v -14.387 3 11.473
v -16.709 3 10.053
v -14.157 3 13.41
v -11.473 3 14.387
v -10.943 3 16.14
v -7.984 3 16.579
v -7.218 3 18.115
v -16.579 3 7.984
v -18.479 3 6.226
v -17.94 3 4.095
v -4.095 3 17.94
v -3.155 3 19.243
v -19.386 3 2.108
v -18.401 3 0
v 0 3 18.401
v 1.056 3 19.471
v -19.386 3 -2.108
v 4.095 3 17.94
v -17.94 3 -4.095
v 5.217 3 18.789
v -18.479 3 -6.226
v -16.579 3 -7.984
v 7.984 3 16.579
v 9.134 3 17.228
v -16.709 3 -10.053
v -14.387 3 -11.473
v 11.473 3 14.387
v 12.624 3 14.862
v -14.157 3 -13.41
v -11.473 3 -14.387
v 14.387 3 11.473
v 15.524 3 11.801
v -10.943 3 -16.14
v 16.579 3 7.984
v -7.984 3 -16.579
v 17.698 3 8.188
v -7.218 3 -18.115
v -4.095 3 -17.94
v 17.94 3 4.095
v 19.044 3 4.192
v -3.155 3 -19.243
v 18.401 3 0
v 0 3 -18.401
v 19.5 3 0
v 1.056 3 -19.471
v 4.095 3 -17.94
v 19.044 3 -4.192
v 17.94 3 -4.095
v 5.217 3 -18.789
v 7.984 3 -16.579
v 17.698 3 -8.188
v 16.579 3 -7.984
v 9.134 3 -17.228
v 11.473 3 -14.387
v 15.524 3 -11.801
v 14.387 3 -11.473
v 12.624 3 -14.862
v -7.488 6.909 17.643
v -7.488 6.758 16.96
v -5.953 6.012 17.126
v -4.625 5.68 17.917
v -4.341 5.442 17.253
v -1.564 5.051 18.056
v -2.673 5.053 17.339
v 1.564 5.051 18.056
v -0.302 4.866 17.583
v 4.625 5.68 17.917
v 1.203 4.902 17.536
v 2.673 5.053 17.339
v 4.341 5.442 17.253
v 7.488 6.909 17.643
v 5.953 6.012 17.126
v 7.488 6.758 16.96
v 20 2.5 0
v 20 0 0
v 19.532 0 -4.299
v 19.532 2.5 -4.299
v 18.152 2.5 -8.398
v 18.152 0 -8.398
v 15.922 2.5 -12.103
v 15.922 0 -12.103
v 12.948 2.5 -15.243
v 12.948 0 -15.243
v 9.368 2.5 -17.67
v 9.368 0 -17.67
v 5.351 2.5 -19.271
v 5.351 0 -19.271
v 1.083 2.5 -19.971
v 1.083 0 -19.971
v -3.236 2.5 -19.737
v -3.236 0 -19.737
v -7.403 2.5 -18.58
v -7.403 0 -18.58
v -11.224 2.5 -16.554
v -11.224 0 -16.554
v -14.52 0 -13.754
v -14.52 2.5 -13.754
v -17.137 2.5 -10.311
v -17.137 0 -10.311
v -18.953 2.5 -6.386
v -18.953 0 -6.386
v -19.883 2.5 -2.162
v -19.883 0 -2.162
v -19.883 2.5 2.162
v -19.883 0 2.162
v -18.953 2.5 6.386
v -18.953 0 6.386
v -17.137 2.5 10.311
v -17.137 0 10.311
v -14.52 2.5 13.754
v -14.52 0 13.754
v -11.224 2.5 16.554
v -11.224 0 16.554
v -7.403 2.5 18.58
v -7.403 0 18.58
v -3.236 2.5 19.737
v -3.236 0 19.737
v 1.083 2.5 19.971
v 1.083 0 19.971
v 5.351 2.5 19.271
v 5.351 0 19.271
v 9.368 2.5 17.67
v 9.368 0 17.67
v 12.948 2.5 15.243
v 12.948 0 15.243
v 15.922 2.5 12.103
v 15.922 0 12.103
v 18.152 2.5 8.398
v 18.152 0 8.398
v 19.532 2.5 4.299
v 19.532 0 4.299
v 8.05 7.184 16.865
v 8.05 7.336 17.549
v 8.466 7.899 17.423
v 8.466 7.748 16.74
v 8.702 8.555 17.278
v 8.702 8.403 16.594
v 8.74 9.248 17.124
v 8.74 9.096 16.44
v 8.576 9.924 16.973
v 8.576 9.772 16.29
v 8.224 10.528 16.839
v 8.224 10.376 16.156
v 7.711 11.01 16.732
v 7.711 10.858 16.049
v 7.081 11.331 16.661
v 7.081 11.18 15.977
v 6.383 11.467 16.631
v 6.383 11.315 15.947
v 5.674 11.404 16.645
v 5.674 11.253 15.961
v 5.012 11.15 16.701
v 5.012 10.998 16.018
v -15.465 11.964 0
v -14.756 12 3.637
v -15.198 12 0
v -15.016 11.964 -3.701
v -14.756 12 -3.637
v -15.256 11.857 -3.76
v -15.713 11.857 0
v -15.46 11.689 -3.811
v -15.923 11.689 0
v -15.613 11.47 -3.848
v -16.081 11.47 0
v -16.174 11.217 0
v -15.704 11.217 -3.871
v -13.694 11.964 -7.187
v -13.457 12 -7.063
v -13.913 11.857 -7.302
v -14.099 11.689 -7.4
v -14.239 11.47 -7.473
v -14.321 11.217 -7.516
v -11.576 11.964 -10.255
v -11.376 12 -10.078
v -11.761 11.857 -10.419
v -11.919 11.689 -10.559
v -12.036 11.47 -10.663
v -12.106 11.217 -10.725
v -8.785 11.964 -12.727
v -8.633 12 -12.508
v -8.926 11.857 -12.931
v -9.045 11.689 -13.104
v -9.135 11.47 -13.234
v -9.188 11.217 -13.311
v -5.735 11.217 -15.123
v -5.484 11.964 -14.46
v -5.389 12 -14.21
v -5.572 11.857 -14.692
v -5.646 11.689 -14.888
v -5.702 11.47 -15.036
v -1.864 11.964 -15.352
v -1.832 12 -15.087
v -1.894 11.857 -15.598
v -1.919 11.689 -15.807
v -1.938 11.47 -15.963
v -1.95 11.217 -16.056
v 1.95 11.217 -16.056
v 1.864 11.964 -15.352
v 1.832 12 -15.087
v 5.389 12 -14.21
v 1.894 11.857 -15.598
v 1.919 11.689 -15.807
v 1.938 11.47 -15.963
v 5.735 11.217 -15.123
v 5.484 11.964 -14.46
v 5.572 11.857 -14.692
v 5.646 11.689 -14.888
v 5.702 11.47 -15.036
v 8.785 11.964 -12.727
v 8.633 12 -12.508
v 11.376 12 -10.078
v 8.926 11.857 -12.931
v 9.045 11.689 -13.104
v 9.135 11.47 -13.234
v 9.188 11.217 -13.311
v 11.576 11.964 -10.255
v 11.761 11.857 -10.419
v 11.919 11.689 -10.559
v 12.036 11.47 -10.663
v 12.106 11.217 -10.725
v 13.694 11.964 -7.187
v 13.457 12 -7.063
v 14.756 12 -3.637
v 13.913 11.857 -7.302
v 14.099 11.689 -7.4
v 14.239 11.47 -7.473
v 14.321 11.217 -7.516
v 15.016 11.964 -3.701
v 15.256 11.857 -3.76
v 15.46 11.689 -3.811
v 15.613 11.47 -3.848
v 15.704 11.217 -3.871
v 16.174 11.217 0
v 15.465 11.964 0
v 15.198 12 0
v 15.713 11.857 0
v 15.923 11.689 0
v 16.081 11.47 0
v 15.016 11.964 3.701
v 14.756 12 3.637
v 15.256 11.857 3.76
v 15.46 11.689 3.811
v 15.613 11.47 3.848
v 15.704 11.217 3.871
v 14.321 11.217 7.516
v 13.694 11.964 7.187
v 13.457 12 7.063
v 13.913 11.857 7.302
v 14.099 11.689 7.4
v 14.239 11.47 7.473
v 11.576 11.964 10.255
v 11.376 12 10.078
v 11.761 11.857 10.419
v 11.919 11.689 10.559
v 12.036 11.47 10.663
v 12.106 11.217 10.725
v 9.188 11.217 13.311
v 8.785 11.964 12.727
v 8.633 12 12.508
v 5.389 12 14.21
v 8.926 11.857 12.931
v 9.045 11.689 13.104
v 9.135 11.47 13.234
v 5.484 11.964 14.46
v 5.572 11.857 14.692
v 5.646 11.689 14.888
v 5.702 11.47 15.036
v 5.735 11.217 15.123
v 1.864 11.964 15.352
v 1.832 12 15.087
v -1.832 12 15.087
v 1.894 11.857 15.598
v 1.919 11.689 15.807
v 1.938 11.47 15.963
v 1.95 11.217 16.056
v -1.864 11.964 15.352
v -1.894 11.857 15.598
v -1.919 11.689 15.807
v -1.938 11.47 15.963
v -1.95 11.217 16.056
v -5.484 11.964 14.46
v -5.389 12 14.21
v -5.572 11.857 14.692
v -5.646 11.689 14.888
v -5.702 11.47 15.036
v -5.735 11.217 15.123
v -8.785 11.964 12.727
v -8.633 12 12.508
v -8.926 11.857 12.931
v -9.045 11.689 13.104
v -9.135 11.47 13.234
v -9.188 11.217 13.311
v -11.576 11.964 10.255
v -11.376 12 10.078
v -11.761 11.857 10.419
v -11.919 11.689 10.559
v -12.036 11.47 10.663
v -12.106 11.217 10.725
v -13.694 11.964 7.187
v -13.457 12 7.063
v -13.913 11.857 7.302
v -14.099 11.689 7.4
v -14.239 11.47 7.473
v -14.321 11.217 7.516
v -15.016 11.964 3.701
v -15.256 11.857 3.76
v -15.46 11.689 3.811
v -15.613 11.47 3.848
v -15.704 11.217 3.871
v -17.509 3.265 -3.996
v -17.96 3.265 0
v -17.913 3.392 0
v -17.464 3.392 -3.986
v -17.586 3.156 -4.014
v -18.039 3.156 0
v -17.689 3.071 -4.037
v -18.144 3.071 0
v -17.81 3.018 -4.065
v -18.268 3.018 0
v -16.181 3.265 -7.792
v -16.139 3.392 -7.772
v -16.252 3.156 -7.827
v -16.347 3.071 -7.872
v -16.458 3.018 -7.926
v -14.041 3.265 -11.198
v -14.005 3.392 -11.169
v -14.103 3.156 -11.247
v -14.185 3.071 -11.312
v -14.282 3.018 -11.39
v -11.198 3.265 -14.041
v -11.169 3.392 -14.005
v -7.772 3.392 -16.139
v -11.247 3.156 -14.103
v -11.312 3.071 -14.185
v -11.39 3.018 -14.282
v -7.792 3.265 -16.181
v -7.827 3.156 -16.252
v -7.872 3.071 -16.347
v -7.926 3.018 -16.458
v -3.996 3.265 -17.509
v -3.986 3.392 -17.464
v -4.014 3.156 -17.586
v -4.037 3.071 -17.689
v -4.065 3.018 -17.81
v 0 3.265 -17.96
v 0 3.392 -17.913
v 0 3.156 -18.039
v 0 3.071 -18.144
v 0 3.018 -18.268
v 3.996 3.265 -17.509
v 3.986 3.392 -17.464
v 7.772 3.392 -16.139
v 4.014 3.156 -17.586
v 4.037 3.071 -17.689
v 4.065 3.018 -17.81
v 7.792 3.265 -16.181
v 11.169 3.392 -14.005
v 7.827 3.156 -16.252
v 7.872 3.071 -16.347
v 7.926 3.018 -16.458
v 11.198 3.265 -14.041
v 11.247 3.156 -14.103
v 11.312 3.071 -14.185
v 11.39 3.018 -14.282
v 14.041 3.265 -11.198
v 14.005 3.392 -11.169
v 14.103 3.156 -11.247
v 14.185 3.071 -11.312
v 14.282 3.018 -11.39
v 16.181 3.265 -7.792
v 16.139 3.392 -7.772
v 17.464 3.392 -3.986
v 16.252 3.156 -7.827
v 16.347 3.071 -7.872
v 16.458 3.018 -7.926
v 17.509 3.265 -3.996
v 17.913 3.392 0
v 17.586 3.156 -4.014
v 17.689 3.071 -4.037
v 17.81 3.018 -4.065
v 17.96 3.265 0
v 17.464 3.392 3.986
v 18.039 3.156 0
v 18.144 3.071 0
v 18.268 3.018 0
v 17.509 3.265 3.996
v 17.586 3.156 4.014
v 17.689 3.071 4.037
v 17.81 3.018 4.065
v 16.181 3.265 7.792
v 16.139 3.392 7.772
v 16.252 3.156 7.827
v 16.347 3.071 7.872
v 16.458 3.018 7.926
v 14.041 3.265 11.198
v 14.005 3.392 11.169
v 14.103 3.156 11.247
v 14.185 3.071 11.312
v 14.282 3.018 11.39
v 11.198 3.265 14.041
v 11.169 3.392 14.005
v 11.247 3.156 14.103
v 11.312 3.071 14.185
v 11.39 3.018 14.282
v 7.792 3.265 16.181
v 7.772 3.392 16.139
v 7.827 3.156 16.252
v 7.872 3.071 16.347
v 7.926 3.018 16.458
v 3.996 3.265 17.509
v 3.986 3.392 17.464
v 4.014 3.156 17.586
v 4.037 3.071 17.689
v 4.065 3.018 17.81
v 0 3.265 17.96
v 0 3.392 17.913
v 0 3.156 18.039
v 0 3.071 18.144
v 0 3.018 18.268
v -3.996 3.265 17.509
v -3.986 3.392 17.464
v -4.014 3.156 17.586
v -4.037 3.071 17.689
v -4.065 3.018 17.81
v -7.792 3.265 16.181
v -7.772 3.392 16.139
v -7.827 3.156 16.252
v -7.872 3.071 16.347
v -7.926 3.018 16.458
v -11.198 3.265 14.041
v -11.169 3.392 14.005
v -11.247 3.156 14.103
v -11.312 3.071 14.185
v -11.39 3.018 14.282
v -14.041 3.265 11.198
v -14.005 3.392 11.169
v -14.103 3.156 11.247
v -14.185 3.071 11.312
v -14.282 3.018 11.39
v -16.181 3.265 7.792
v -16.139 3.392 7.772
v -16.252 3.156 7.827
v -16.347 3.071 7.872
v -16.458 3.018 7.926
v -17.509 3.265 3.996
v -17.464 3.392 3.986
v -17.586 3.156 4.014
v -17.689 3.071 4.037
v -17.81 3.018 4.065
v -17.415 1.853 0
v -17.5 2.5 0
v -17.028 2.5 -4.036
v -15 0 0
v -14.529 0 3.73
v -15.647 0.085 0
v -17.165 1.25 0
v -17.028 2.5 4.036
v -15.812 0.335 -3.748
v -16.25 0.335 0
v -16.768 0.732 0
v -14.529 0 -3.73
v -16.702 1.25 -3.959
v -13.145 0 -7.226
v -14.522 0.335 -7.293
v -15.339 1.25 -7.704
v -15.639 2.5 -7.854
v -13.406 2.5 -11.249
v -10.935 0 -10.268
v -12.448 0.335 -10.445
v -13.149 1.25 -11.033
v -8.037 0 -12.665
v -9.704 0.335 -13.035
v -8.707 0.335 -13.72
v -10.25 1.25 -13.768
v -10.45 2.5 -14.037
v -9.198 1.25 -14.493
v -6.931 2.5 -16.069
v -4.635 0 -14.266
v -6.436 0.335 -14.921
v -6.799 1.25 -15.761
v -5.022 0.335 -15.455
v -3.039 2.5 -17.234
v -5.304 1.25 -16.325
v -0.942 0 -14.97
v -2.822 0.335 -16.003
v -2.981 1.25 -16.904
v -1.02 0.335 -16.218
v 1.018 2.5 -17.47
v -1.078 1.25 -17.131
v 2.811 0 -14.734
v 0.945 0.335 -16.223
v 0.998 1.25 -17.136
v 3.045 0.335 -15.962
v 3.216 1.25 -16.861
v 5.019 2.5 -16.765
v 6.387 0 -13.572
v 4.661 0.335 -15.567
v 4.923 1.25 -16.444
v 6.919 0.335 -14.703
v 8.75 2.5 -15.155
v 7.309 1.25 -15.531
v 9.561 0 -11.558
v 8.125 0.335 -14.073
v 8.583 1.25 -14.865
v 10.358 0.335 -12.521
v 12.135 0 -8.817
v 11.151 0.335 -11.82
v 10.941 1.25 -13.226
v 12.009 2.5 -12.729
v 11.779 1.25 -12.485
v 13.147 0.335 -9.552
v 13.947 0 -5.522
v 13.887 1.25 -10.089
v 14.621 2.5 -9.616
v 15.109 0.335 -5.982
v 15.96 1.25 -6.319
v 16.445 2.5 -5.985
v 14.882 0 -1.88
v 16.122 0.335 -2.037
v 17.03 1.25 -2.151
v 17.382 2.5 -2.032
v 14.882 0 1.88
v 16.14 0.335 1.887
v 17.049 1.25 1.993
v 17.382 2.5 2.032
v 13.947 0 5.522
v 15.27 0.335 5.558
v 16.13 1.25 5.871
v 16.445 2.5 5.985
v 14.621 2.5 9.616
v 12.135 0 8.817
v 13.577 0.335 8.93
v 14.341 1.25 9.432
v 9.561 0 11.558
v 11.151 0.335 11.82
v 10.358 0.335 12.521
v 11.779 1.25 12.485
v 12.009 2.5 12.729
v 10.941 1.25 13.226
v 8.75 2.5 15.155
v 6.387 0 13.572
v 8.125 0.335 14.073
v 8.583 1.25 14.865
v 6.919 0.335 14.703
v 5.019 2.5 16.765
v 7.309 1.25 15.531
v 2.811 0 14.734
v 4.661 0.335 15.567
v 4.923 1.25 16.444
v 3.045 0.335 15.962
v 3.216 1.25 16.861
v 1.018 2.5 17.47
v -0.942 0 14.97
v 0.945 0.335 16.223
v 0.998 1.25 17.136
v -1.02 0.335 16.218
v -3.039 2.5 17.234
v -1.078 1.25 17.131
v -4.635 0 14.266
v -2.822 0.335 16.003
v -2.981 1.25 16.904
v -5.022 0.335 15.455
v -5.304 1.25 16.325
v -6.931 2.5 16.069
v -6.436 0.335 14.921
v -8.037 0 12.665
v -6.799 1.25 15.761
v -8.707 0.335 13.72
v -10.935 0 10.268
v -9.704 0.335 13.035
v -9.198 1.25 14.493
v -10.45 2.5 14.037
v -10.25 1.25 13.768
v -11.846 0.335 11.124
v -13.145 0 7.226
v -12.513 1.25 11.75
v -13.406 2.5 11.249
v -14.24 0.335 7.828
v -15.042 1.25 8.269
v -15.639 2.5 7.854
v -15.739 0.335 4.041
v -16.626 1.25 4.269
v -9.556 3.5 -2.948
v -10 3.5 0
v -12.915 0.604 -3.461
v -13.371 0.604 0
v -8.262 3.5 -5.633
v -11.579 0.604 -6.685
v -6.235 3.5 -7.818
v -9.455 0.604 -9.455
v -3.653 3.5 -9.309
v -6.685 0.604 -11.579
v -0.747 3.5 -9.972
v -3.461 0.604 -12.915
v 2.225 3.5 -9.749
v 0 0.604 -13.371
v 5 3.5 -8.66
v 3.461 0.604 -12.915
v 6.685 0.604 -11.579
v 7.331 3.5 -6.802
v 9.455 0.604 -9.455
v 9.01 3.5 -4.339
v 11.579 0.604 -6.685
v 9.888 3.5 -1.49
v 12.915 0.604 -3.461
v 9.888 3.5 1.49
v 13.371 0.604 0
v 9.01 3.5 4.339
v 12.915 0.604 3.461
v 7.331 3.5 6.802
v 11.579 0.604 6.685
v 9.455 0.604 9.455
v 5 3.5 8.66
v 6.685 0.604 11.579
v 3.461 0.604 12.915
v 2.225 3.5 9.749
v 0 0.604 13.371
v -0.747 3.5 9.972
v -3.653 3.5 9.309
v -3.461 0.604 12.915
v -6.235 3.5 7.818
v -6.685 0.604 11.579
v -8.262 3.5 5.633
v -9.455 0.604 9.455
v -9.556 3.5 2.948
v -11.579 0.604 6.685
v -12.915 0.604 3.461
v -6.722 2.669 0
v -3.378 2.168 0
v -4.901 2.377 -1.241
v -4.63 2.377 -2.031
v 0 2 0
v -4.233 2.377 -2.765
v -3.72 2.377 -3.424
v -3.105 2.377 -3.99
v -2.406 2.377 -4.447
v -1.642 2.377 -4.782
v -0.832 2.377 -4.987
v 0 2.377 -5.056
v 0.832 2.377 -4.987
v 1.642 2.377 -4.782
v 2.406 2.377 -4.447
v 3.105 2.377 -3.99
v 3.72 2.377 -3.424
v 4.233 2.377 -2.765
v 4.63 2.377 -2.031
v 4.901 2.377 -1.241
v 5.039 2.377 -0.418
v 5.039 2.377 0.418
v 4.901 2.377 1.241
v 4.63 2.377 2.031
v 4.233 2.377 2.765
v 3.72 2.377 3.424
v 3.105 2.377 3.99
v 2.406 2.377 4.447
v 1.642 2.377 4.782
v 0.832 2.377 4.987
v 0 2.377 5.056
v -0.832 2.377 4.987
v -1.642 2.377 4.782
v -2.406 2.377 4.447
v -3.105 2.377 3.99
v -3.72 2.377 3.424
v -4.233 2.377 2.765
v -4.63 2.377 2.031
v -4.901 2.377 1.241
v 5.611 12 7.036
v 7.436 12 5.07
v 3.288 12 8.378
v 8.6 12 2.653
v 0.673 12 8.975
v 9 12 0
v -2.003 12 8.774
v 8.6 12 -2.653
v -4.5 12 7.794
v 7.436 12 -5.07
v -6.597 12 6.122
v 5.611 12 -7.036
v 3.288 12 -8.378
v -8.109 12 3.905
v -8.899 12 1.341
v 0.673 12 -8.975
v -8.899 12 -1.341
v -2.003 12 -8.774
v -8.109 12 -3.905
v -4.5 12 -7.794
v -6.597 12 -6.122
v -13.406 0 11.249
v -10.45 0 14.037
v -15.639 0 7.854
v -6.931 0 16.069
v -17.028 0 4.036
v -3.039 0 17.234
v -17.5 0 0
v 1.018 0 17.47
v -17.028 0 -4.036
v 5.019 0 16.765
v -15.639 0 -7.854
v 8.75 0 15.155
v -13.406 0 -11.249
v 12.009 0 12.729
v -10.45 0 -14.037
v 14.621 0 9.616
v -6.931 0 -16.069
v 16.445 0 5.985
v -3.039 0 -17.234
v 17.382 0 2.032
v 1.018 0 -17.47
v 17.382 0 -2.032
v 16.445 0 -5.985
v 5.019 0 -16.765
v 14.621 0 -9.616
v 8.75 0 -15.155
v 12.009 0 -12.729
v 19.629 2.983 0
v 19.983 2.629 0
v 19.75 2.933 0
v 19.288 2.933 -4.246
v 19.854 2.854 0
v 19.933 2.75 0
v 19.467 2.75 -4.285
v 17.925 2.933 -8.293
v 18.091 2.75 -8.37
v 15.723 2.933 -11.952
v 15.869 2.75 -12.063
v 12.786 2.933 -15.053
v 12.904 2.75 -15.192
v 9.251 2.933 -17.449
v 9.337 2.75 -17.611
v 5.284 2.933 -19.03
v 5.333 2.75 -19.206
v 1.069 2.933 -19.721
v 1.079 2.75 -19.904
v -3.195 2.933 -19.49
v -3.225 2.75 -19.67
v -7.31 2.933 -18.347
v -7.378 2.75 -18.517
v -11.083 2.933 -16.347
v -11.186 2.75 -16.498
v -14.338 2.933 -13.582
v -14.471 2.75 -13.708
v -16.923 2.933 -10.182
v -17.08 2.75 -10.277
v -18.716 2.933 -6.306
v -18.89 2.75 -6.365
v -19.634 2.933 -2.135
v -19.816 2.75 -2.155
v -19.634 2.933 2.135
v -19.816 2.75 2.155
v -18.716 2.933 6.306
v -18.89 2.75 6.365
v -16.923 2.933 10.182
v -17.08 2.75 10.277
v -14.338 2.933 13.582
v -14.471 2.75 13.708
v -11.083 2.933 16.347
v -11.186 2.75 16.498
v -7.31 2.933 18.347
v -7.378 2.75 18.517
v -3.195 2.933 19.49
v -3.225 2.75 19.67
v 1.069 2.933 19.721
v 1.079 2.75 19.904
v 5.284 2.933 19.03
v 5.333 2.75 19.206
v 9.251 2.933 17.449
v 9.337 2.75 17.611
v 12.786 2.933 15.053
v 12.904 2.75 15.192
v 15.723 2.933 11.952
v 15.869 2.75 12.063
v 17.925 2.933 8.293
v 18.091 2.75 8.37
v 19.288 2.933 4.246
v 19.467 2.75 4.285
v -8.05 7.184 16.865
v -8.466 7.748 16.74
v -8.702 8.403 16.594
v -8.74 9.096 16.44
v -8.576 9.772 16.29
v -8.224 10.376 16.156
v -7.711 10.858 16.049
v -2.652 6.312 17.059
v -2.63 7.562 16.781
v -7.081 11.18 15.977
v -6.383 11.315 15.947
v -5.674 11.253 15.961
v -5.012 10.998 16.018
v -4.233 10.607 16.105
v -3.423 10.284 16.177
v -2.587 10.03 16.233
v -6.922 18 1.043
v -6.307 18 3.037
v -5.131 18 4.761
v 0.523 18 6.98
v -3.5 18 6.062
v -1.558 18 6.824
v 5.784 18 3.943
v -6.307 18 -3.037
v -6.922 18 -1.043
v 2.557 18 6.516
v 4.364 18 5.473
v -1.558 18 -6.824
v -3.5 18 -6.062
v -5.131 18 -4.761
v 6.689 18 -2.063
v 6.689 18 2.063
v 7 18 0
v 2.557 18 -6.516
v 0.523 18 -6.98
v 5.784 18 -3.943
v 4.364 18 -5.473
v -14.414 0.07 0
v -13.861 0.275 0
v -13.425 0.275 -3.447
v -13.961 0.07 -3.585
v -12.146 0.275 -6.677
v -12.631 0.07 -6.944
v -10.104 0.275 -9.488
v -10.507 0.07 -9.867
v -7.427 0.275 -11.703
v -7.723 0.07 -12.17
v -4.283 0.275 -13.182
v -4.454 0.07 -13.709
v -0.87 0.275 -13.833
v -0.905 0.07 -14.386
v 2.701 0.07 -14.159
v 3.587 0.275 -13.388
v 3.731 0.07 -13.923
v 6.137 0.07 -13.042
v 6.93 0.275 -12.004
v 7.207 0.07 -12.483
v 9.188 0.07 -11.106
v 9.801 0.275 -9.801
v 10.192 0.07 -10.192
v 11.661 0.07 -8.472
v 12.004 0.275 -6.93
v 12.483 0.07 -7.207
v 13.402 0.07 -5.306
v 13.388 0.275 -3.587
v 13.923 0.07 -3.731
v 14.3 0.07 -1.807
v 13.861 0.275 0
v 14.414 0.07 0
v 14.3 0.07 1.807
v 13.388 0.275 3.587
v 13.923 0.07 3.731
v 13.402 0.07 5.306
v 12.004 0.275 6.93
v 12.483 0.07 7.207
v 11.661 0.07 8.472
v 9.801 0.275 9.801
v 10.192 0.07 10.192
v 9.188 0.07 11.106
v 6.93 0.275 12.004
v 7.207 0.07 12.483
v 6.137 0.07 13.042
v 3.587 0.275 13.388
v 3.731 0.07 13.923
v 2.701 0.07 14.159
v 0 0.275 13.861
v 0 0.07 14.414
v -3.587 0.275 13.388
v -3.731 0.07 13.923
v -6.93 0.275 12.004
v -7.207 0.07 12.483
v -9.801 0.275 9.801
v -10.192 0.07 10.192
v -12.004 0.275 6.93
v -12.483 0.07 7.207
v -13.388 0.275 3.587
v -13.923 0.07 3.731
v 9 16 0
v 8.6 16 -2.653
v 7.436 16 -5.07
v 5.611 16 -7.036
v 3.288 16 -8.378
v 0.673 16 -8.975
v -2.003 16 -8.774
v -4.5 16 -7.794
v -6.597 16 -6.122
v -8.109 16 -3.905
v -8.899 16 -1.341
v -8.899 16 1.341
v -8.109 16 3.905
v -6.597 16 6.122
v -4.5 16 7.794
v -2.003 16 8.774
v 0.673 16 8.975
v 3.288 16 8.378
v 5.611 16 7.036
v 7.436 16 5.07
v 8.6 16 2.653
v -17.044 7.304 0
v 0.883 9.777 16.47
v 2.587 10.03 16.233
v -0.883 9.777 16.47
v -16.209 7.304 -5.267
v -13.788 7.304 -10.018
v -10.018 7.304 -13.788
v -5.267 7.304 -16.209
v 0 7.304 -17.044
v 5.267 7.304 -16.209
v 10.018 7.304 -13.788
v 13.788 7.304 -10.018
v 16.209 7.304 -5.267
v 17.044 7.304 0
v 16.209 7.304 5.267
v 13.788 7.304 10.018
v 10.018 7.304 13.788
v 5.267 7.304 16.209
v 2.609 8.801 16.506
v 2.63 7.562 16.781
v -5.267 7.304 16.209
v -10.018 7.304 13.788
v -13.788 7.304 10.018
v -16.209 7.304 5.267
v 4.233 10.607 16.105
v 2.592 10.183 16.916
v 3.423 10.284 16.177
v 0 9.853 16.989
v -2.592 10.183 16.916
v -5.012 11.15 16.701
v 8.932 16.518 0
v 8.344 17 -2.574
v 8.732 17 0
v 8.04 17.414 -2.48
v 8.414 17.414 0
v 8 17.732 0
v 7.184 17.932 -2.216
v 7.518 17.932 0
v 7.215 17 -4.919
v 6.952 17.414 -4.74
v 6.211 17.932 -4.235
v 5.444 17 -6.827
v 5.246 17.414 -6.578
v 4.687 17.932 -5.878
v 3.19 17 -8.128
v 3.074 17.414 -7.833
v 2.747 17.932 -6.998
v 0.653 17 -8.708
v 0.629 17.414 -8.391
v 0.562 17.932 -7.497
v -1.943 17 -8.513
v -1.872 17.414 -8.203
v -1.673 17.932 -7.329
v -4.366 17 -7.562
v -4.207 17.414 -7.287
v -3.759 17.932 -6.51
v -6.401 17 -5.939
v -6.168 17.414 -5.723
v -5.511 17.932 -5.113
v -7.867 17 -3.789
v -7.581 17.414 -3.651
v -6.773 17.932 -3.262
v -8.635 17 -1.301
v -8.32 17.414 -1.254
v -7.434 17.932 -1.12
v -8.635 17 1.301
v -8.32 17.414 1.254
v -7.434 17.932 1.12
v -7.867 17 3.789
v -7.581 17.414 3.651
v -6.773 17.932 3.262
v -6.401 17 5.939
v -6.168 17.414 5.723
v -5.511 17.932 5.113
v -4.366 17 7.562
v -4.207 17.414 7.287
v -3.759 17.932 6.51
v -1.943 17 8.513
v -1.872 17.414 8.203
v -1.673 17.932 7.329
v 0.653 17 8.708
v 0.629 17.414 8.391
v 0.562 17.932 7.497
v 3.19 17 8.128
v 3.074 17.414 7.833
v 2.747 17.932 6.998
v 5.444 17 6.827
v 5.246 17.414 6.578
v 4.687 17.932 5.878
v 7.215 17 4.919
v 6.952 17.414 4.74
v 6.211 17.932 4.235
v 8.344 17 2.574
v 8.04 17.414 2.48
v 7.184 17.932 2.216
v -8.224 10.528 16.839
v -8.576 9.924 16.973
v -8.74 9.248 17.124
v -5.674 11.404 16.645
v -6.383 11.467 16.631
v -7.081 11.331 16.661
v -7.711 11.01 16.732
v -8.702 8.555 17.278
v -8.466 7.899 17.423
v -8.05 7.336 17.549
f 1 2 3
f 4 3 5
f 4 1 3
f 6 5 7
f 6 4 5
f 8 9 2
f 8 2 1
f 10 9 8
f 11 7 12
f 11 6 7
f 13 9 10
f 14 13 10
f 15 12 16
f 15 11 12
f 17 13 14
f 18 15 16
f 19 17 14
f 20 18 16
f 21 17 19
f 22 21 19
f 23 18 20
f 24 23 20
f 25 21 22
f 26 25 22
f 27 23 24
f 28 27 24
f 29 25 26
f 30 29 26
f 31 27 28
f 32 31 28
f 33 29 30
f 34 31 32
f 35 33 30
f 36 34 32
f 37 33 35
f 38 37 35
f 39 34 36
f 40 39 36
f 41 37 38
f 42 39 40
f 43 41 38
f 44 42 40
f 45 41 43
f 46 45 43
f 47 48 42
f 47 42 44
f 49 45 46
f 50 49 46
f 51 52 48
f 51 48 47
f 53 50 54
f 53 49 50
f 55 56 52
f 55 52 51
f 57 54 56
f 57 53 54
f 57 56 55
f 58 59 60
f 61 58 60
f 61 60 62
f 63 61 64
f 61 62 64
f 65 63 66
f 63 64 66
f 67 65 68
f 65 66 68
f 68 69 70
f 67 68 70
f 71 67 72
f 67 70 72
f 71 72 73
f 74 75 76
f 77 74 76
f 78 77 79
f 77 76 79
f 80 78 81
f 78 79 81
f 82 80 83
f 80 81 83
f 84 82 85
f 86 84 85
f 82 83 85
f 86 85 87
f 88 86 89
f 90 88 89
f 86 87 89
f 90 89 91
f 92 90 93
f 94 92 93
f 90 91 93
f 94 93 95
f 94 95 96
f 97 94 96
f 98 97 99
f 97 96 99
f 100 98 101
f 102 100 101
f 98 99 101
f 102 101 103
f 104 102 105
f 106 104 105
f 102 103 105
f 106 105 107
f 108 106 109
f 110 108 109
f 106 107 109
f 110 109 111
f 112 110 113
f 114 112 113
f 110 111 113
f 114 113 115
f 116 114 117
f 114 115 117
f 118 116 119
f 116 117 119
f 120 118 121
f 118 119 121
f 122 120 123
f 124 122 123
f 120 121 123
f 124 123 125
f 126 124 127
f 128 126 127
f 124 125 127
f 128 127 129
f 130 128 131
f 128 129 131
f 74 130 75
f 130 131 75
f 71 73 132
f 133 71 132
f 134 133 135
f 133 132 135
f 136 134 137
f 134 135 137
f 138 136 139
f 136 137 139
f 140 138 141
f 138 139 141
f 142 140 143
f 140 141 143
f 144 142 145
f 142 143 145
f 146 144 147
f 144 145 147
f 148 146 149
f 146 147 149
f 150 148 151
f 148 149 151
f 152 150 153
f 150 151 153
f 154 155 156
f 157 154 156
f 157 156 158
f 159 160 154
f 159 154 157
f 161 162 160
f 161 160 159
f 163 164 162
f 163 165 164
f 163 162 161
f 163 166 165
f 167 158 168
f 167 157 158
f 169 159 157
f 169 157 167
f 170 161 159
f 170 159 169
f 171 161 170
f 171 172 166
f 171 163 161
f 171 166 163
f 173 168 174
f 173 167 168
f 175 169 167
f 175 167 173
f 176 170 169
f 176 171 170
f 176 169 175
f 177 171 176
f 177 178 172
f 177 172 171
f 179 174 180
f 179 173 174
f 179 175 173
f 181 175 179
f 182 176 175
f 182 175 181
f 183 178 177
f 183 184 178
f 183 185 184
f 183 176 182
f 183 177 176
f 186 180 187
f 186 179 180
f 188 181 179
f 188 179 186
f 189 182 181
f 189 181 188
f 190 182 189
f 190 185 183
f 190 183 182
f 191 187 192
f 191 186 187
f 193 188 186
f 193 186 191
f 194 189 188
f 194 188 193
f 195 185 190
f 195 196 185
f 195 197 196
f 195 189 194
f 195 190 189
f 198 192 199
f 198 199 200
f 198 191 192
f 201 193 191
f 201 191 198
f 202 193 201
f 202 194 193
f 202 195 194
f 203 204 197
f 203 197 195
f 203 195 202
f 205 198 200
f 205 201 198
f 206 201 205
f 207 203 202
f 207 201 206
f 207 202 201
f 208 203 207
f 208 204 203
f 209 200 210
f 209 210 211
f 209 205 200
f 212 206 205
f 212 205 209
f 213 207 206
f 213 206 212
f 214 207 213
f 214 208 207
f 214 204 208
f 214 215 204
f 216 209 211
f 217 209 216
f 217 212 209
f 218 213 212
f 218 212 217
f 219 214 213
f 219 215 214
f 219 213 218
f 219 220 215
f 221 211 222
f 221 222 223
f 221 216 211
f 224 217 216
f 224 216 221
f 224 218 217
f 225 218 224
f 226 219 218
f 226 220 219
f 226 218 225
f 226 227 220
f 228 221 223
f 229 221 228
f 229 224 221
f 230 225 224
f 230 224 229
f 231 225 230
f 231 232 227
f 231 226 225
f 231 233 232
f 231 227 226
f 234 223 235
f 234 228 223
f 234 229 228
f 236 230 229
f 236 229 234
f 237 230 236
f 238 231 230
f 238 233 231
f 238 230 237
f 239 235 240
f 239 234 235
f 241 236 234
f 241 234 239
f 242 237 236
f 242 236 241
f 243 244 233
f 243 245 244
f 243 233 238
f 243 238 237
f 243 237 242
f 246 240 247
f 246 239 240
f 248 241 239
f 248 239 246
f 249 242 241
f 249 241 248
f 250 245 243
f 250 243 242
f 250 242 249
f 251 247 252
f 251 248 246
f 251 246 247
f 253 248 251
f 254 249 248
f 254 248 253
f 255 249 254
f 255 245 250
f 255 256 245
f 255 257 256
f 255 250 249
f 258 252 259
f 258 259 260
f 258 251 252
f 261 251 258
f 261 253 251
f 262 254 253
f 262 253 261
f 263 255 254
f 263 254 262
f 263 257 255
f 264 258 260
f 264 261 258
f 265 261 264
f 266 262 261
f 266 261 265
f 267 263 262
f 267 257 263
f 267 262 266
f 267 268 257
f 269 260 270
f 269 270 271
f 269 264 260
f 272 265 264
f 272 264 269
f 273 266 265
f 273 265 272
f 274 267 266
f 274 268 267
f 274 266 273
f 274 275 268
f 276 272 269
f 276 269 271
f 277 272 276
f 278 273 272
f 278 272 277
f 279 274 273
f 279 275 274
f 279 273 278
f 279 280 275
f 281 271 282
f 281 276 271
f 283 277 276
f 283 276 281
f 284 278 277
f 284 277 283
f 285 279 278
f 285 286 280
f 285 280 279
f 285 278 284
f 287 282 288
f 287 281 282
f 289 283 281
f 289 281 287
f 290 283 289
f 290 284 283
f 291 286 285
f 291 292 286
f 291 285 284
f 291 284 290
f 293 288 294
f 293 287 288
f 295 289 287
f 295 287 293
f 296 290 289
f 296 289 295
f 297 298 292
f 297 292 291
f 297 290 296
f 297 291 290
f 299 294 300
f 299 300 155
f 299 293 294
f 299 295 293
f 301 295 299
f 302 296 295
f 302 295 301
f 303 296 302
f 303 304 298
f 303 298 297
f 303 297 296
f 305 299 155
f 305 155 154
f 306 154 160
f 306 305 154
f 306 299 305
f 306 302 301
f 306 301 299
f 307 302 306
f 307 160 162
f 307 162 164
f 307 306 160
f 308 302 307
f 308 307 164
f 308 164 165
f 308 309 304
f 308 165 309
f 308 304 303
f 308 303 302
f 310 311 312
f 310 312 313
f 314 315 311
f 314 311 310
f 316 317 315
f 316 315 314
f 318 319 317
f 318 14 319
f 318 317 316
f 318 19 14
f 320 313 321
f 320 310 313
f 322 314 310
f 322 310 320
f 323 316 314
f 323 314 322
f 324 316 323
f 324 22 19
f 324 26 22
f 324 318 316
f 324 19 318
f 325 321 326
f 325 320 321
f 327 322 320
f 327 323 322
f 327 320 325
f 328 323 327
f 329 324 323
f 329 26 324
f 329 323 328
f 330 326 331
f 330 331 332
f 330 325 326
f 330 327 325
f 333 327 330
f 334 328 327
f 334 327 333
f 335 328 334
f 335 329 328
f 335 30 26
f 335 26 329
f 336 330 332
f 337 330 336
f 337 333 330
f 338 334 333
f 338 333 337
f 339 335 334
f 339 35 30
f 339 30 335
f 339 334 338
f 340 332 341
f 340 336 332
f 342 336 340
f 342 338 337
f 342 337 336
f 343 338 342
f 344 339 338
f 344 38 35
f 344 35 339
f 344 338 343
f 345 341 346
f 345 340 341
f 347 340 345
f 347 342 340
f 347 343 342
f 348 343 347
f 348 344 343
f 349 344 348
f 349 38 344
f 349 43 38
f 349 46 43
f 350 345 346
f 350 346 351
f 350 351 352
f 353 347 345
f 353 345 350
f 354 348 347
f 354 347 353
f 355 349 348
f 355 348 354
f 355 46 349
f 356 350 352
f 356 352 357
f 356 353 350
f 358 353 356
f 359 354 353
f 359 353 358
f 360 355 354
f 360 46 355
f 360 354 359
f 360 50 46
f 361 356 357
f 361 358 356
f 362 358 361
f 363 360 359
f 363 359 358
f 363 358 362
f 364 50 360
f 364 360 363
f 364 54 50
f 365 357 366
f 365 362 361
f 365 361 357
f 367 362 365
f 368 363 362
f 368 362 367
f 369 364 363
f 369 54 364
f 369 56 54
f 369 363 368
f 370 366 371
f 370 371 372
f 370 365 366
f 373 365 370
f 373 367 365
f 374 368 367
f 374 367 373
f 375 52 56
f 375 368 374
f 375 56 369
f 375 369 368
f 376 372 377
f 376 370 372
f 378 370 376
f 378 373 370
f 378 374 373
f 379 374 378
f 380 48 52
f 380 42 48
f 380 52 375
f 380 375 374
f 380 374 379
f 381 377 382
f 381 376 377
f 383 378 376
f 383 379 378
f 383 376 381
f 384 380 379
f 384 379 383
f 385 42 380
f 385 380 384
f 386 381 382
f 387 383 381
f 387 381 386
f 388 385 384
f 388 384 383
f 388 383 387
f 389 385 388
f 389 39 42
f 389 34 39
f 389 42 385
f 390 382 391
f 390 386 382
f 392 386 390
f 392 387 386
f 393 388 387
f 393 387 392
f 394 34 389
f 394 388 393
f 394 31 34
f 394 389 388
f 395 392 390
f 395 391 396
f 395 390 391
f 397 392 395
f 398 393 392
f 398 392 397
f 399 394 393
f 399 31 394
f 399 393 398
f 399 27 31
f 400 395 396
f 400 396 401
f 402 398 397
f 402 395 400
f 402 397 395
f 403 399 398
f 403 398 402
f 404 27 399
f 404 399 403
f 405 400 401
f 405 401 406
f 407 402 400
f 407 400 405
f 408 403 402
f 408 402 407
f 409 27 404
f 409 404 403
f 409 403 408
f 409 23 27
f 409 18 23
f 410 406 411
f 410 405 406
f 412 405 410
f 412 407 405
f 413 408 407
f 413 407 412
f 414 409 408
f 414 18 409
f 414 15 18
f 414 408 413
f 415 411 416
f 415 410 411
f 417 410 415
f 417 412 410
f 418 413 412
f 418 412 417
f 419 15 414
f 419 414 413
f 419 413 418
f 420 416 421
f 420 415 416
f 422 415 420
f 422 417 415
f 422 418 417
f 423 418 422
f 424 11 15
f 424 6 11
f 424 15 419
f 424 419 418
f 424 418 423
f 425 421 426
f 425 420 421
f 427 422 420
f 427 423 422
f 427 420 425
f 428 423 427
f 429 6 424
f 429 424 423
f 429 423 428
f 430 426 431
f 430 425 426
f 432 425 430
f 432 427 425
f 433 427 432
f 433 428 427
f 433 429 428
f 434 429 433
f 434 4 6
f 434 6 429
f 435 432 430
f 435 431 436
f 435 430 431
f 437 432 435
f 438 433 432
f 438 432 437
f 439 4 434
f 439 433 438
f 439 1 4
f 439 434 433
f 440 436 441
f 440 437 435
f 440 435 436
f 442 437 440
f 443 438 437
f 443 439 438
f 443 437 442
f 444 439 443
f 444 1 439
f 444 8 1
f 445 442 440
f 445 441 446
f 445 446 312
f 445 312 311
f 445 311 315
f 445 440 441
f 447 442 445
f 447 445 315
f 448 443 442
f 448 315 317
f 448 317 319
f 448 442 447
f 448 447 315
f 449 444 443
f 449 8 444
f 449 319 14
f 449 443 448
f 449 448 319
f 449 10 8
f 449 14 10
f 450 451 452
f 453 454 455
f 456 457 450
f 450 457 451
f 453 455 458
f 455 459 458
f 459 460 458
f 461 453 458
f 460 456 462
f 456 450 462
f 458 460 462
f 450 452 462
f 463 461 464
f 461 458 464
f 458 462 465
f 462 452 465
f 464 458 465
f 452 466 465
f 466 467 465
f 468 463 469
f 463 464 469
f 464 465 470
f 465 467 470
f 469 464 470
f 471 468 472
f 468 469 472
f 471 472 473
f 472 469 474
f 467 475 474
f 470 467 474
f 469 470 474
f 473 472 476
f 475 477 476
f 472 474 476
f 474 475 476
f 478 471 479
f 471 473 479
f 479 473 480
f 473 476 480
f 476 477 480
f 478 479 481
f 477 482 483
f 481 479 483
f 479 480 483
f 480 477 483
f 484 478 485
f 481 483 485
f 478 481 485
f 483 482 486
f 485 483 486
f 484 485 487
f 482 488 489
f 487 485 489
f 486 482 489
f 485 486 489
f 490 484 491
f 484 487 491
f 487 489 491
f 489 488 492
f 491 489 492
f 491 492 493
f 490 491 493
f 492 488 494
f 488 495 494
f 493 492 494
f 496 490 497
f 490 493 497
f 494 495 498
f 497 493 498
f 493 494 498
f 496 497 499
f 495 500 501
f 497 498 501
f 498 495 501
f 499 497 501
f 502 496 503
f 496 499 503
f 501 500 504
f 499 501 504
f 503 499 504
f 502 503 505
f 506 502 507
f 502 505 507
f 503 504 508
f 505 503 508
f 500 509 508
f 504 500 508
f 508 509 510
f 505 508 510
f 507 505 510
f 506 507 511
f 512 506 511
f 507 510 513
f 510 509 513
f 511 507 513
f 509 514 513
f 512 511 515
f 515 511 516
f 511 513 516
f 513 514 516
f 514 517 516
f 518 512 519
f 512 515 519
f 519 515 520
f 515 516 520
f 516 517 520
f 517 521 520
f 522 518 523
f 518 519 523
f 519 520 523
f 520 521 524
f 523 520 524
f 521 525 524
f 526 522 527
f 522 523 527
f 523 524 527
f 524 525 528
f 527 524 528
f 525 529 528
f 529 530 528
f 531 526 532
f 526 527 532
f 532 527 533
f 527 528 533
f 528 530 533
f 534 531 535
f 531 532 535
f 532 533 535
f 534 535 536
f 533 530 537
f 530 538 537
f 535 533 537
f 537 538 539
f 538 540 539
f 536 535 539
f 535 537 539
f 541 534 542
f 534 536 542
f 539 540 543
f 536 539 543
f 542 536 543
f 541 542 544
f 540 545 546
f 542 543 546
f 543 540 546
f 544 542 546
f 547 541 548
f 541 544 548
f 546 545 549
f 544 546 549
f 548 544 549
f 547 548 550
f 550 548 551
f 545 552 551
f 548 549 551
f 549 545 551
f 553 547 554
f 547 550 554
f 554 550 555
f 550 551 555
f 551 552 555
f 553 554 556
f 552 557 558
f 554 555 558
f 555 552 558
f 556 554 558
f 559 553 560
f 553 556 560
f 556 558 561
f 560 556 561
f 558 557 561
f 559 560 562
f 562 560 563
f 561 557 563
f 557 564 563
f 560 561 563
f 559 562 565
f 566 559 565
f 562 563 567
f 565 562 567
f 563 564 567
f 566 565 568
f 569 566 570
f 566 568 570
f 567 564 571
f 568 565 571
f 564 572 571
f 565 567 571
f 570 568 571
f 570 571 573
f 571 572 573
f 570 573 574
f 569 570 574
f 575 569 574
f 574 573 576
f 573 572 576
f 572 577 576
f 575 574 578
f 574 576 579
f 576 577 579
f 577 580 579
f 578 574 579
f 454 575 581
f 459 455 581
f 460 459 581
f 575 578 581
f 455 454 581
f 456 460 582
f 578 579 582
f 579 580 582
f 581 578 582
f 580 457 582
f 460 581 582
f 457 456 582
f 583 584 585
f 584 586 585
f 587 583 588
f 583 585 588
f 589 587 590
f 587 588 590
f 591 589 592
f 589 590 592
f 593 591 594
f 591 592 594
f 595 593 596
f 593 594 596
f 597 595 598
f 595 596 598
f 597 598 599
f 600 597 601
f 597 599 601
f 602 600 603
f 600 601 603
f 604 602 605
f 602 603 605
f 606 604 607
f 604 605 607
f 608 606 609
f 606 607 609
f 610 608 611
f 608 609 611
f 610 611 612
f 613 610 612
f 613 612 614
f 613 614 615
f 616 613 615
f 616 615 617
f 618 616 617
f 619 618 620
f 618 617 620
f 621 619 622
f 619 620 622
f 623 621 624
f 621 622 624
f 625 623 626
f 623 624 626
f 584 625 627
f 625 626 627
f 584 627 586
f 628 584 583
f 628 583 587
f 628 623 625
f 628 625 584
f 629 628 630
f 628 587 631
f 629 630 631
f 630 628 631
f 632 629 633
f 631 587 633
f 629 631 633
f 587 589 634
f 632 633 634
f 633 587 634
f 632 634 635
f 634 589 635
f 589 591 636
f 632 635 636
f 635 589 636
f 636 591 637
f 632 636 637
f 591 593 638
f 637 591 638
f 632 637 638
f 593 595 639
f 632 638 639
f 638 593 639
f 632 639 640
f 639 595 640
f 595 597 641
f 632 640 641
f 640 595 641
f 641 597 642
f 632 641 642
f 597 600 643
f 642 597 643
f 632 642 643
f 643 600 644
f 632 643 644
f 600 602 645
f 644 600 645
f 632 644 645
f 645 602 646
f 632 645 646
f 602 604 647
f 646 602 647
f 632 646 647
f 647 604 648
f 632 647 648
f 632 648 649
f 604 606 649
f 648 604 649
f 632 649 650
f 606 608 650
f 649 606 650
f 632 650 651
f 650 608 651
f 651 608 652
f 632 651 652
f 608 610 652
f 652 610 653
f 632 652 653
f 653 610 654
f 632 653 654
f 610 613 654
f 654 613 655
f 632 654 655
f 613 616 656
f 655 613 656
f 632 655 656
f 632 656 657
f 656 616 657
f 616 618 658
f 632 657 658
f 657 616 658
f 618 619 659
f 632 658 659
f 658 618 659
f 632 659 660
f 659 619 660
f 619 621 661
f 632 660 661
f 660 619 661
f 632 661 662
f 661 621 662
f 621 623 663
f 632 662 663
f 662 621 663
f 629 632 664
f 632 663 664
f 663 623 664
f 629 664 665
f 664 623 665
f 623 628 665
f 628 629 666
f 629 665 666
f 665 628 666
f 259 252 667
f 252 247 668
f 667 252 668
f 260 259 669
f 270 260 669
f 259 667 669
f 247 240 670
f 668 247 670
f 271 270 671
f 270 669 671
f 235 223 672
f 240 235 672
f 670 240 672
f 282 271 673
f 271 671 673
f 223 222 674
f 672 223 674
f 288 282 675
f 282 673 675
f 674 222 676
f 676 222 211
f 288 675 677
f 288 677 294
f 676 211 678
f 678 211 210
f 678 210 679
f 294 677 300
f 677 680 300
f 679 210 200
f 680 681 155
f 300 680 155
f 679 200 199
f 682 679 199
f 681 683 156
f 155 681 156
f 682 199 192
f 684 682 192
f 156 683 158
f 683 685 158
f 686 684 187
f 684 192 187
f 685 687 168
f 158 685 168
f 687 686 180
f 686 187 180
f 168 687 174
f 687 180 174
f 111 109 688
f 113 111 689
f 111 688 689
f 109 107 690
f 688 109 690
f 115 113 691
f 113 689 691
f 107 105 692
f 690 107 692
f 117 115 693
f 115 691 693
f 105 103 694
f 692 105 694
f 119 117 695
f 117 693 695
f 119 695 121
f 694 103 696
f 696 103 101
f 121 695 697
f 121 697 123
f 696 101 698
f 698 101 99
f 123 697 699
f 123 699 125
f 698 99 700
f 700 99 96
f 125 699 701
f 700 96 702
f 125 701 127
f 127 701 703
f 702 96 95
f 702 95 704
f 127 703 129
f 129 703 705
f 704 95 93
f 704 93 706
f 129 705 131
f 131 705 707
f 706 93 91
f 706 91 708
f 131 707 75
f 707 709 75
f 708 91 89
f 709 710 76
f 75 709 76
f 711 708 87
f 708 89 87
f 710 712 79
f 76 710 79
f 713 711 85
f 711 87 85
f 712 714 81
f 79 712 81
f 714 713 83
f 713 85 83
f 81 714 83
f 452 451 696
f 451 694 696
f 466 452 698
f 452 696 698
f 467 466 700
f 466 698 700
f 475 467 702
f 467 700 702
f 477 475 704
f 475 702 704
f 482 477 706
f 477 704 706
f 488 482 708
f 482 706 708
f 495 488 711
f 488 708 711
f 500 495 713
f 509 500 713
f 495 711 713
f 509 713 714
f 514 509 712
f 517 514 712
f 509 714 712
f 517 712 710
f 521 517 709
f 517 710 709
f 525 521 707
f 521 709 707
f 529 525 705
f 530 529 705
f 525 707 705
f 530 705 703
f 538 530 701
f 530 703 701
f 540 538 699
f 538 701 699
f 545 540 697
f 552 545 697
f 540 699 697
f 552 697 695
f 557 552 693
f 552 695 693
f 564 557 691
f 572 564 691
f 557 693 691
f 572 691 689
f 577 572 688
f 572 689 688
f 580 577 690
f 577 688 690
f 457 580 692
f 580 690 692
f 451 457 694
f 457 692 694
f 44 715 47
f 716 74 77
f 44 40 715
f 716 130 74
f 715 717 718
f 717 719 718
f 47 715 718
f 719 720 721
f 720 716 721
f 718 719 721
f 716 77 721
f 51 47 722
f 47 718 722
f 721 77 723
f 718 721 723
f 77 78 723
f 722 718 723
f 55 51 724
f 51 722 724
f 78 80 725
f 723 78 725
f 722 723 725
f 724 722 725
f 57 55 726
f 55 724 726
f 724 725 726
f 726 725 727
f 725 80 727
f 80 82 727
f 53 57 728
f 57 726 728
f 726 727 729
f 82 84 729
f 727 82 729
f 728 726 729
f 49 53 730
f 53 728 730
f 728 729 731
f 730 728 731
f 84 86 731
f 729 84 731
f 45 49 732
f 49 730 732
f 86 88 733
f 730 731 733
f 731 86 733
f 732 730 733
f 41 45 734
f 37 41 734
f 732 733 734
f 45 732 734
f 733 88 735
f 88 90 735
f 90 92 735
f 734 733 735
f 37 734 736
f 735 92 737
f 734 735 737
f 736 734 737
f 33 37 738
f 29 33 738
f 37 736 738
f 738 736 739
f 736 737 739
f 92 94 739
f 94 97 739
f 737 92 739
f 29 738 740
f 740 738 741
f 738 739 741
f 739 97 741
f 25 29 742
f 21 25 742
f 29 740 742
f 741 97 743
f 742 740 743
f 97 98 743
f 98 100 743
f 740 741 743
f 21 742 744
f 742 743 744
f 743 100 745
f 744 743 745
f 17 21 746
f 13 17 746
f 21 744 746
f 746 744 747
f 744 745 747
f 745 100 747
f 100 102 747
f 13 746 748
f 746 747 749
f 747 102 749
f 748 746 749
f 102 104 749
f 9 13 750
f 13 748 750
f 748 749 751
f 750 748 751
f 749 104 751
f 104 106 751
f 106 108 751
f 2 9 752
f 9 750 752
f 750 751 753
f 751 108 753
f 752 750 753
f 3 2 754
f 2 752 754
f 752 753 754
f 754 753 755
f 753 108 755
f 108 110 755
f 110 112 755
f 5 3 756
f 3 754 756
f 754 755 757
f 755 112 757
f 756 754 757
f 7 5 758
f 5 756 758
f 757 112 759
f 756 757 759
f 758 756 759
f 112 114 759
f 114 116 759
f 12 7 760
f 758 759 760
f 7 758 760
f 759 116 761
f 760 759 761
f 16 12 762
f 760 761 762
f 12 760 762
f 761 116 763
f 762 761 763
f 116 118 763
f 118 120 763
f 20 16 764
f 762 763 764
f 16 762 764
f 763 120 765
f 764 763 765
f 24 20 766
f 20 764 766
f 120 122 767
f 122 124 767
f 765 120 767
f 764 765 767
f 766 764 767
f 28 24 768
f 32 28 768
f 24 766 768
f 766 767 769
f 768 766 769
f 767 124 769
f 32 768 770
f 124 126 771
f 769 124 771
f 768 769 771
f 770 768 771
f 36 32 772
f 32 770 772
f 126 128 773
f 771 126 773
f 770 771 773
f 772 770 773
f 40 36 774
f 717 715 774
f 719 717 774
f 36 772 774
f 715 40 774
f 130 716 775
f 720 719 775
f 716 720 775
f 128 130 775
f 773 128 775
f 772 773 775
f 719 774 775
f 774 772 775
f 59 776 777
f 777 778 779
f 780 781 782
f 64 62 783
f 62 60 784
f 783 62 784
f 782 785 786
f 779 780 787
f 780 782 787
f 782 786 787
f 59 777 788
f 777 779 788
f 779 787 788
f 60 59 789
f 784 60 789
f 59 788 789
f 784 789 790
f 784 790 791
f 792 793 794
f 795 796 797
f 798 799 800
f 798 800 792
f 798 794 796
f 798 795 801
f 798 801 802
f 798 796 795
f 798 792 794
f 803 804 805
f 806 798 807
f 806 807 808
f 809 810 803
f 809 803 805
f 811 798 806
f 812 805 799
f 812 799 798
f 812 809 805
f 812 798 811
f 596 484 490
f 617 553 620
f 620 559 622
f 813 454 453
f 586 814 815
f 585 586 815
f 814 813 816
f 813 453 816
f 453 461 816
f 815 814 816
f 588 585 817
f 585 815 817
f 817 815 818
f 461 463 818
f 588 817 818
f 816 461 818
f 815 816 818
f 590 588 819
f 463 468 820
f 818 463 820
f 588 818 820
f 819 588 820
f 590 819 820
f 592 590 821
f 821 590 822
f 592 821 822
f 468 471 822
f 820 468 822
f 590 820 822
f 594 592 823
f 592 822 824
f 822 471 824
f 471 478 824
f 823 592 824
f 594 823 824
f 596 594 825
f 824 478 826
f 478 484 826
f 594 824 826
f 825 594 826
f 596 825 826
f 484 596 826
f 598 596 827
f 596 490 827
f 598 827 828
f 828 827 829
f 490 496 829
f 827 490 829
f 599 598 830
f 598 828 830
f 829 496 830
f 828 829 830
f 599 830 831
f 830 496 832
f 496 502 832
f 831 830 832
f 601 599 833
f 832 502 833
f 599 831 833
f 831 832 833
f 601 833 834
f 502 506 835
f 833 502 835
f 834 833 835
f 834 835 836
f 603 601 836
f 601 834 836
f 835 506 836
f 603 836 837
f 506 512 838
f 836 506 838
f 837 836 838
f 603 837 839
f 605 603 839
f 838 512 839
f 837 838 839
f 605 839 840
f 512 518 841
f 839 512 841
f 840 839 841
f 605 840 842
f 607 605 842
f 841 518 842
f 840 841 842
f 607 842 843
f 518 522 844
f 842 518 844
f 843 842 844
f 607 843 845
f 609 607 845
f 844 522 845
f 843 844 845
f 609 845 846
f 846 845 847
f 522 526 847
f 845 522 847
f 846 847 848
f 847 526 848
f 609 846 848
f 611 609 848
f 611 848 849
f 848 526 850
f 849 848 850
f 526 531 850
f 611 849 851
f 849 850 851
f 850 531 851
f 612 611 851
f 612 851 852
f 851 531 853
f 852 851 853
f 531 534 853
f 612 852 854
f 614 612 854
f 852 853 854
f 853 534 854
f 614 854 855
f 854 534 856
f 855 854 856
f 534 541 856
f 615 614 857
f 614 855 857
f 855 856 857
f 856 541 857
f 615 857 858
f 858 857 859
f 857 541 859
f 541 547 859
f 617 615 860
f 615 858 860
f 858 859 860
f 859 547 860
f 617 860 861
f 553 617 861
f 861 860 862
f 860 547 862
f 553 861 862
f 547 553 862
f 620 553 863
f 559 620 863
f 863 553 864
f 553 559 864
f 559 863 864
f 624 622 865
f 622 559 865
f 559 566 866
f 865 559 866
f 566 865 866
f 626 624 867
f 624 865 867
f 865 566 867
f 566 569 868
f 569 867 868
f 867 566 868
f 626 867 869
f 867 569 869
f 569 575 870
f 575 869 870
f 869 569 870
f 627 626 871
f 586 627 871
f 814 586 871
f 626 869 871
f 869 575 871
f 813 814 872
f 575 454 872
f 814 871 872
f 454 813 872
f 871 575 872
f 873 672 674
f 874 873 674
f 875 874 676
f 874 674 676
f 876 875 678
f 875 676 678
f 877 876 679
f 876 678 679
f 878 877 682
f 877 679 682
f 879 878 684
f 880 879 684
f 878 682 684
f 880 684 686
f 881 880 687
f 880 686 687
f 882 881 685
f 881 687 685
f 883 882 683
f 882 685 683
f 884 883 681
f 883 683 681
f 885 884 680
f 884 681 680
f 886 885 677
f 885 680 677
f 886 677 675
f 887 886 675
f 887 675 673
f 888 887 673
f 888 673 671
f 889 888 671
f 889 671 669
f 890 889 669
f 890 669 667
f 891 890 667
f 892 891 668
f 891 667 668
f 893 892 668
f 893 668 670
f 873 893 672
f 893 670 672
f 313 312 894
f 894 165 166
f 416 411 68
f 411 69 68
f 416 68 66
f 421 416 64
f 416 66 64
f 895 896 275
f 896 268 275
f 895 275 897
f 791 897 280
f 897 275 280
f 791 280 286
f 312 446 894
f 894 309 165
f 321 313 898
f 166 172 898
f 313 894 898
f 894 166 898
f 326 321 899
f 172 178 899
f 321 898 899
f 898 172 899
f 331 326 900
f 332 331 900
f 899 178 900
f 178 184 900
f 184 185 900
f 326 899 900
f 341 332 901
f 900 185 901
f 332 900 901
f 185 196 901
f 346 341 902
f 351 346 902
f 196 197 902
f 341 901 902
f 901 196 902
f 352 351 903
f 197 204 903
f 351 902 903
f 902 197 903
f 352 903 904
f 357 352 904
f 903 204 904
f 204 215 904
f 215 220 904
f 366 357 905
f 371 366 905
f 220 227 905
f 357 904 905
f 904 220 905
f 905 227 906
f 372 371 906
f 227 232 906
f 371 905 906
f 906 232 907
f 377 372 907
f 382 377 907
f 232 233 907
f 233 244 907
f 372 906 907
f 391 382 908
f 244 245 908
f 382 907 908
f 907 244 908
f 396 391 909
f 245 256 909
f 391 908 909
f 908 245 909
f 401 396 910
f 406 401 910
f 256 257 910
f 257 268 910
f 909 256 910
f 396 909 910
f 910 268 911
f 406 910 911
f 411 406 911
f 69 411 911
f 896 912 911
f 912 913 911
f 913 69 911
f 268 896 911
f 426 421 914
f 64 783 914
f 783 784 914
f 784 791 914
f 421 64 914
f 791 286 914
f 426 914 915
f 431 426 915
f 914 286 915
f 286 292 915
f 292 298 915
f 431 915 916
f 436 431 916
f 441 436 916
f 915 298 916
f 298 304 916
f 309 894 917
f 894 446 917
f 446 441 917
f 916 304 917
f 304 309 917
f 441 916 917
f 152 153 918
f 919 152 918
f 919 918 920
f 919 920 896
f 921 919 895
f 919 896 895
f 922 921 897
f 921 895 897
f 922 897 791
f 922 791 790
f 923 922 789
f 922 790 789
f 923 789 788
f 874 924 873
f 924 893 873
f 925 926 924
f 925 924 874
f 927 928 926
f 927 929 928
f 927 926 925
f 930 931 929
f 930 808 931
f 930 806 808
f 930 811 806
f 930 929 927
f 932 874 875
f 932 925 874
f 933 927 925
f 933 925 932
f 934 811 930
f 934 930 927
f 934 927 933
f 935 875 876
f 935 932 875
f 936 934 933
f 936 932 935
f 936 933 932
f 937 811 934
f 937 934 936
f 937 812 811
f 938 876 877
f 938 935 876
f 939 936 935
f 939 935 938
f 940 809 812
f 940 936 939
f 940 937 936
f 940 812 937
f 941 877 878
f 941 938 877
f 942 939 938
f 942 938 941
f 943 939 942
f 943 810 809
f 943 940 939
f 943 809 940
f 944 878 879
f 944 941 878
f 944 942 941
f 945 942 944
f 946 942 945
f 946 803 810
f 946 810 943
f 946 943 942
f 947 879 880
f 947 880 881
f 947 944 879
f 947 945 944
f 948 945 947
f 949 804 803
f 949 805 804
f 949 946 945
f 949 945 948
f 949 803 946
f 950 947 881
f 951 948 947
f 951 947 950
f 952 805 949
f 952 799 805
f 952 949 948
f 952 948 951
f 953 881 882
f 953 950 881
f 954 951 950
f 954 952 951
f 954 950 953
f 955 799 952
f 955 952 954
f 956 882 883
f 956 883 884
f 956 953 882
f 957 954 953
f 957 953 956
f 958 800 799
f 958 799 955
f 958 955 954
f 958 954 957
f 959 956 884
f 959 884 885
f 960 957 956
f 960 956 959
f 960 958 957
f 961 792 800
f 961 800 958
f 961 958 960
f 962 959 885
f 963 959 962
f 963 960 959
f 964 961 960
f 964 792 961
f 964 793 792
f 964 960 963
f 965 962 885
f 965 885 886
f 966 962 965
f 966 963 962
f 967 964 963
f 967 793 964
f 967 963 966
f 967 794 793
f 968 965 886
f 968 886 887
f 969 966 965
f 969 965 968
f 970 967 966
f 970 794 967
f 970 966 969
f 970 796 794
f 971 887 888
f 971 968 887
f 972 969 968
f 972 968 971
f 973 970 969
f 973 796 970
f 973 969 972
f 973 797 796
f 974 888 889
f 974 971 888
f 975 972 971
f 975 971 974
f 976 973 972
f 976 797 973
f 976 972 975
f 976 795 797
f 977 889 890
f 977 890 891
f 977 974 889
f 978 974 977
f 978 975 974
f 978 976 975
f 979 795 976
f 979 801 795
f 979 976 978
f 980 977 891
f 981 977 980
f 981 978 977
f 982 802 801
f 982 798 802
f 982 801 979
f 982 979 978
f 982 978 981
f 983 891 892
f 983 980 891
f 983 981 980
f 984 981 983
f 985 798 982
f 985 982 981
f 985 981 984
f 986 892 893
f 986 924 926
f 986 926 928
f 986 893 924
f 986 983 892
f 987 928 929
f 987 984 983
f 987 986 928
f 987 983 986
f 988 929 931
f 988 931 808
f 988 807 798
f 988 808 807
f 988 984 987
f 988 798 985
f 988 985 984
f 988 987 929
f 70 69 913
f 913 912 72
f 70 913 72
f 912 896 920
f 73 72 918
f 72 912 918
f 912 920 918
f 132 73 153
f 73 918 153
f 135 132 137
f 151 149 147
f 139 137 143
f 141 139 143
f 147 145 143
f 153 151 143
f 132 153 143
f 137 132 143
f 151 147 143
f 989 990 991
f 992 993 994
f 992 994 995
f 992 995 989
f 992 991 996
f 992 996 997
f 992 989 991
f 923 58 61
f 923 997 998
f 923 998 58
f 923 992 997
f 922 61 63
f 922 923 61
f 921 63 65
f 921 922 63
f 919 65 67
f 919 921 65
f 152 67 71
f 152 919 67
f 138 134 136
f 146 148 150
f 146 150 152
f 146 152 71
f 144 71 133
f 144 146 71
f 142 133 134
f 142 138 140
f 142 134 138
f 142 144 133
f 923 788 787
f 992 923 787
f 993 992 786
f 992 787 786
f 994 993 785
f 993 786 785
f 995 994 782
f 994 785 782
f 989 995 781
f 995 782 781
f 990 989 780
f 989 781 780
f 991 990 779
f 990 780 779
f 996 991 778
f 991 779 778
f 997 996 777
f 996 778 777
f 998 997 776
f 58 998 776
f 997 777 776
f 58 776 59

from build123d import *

# Parameters (mm, degrees)
SKETCH_1_R      = 20
EXTRUDE_1_DEPTH = 3
SKETCH_4_R      = 9
EXTRUDE_2_DEPTH = 6
FILLET_1_R      = 2
FILLET_2_R      = 1
FILLET_3_R      = 0.5
EXTRUDE_START   = -0.2
SKETCH_6_W      = 2
SKETCH_6_H      = 2
EXTRUDE_3_DEPTH = 0.7


with BuildPart() as part:
    # 草图1 → 凸台-拉伸1 (new body)
    with BuildSketch(Plane(origin=(0, 0, 0), x_dir=(1, 0, 0), z_dir=(0, 1, 0))):
        Circle(SKETCH_1_R)
    extrude(amount=EXTRUDE_1_DEPTH)

    # 草图3 → 旋转1 (revolve)
    with BuildSketch(Plane.XY):
        Polygon((0, 3), (-18, 3), (-16, 12), (0, 12), align=None)
    revolve(axis=Axis((0, 12, 0), (0, -1, 0)))

    # 草图4 → 凸台-拉伸2 (add)
    with BuildSketch(Plane(origin=(0, 12, 0), x_dir=(1, 0, 0), z_dir=(0, 1, 0))):
        Circle(SKETCH_4_R)
    extrude(amount=EXTRUDE_2_DEPTH)

    # 圆角1
    fillet_1_edges = [part.edges().sort_by_distance(p)[0] for p in [
        (-9, 18, 0),
    ]]
    fillet(fillet_1_edges, radius=FILLET_1_R)

    # 圆角2
    fillet_2_edges = [part.edges().sort_by_distance(p)[0] for p in [
        (16, 12, 0),
    ]]
    fillet(fillet_2_edges, radius=FILLET_2_R)

    # 草图5 → 切除-旋转1 (revolve, cut)
    with BuildSketch(Plane.XY):
        with BuildLine():
            Line((-17.5, 0), (-15, 0))
            ThreePointArc((-15, 0), (-16.767766953, 0.732233047), (-17.5, 2.5))
            Line((-17.5, 2.5), (-17.5, 0))
        make_face()
        with BuildLine():
            Line((-10, 3.5), (-13.370759884, 0.603799419))
            ThreePointArc((-13.370759884, 0.603799419), (-14.131236929, 0.155804887), (-15, 0))
            Line((-15, 0), (0, 0))
            Line((0, 0), (0, 2))
            ThreePointArc((0, 2), (-5.055937104, 2.377085973), (-10, 3.5))
        make_face()
    revolve(axis=Axis((0, 2, 0), (0, -1, 0)), mode=Mode.SUBTRACT)

    # 圆角3
    fillet_3_edges = [part.edges().sort_by_distance(p)[0] for p in [
        (-20, 3, 0),
        (18, 3, 0),
    ]]
    fillet(fillet_3_edges, radius=FILLET_3_R)

    # 草图6 → 凸台-拉伸3 (add)
    with BuildSketch(Plane(origin=(0, 3.952941176, 17.788235294), x_dir=(1, 0, 0), z_dir=(0, 0.216930458, 0.97618706)).offset(EXTRUDE_START)):
        with BuildLine():
            ThreePointArc((-7.488132587, 2.917536085), (0, 0.933042267), (7.488132587, 2.917536085))
            ThreePointArc((7.488132587, 2.917536085), (8.421871934, 6.327540606), (5.011867413, 7.261279953))
            ThreePointArc((5.011867413, 7.261279953), (0, 5.933042267), (-5.011867413, 7.261279953))
            ThreePointArc((-5.011867413, 7.261279953), (-8.421871934, 6.327540606), (-7.488132587, 2.917536085))
        make_face()
        with Locations((0, 3.433042267)):
            Rectangle(SKETCH_6_W, SKETCH_6_H, mode=Mode.SUBTRACT)
        with Locations((0, 3.433042267)):
            Rectangle(SKETCH_6_W, SKETCH_6_H)
    extrude(amount=EXTRUDE_3_DEPTH)


solid = part.part
